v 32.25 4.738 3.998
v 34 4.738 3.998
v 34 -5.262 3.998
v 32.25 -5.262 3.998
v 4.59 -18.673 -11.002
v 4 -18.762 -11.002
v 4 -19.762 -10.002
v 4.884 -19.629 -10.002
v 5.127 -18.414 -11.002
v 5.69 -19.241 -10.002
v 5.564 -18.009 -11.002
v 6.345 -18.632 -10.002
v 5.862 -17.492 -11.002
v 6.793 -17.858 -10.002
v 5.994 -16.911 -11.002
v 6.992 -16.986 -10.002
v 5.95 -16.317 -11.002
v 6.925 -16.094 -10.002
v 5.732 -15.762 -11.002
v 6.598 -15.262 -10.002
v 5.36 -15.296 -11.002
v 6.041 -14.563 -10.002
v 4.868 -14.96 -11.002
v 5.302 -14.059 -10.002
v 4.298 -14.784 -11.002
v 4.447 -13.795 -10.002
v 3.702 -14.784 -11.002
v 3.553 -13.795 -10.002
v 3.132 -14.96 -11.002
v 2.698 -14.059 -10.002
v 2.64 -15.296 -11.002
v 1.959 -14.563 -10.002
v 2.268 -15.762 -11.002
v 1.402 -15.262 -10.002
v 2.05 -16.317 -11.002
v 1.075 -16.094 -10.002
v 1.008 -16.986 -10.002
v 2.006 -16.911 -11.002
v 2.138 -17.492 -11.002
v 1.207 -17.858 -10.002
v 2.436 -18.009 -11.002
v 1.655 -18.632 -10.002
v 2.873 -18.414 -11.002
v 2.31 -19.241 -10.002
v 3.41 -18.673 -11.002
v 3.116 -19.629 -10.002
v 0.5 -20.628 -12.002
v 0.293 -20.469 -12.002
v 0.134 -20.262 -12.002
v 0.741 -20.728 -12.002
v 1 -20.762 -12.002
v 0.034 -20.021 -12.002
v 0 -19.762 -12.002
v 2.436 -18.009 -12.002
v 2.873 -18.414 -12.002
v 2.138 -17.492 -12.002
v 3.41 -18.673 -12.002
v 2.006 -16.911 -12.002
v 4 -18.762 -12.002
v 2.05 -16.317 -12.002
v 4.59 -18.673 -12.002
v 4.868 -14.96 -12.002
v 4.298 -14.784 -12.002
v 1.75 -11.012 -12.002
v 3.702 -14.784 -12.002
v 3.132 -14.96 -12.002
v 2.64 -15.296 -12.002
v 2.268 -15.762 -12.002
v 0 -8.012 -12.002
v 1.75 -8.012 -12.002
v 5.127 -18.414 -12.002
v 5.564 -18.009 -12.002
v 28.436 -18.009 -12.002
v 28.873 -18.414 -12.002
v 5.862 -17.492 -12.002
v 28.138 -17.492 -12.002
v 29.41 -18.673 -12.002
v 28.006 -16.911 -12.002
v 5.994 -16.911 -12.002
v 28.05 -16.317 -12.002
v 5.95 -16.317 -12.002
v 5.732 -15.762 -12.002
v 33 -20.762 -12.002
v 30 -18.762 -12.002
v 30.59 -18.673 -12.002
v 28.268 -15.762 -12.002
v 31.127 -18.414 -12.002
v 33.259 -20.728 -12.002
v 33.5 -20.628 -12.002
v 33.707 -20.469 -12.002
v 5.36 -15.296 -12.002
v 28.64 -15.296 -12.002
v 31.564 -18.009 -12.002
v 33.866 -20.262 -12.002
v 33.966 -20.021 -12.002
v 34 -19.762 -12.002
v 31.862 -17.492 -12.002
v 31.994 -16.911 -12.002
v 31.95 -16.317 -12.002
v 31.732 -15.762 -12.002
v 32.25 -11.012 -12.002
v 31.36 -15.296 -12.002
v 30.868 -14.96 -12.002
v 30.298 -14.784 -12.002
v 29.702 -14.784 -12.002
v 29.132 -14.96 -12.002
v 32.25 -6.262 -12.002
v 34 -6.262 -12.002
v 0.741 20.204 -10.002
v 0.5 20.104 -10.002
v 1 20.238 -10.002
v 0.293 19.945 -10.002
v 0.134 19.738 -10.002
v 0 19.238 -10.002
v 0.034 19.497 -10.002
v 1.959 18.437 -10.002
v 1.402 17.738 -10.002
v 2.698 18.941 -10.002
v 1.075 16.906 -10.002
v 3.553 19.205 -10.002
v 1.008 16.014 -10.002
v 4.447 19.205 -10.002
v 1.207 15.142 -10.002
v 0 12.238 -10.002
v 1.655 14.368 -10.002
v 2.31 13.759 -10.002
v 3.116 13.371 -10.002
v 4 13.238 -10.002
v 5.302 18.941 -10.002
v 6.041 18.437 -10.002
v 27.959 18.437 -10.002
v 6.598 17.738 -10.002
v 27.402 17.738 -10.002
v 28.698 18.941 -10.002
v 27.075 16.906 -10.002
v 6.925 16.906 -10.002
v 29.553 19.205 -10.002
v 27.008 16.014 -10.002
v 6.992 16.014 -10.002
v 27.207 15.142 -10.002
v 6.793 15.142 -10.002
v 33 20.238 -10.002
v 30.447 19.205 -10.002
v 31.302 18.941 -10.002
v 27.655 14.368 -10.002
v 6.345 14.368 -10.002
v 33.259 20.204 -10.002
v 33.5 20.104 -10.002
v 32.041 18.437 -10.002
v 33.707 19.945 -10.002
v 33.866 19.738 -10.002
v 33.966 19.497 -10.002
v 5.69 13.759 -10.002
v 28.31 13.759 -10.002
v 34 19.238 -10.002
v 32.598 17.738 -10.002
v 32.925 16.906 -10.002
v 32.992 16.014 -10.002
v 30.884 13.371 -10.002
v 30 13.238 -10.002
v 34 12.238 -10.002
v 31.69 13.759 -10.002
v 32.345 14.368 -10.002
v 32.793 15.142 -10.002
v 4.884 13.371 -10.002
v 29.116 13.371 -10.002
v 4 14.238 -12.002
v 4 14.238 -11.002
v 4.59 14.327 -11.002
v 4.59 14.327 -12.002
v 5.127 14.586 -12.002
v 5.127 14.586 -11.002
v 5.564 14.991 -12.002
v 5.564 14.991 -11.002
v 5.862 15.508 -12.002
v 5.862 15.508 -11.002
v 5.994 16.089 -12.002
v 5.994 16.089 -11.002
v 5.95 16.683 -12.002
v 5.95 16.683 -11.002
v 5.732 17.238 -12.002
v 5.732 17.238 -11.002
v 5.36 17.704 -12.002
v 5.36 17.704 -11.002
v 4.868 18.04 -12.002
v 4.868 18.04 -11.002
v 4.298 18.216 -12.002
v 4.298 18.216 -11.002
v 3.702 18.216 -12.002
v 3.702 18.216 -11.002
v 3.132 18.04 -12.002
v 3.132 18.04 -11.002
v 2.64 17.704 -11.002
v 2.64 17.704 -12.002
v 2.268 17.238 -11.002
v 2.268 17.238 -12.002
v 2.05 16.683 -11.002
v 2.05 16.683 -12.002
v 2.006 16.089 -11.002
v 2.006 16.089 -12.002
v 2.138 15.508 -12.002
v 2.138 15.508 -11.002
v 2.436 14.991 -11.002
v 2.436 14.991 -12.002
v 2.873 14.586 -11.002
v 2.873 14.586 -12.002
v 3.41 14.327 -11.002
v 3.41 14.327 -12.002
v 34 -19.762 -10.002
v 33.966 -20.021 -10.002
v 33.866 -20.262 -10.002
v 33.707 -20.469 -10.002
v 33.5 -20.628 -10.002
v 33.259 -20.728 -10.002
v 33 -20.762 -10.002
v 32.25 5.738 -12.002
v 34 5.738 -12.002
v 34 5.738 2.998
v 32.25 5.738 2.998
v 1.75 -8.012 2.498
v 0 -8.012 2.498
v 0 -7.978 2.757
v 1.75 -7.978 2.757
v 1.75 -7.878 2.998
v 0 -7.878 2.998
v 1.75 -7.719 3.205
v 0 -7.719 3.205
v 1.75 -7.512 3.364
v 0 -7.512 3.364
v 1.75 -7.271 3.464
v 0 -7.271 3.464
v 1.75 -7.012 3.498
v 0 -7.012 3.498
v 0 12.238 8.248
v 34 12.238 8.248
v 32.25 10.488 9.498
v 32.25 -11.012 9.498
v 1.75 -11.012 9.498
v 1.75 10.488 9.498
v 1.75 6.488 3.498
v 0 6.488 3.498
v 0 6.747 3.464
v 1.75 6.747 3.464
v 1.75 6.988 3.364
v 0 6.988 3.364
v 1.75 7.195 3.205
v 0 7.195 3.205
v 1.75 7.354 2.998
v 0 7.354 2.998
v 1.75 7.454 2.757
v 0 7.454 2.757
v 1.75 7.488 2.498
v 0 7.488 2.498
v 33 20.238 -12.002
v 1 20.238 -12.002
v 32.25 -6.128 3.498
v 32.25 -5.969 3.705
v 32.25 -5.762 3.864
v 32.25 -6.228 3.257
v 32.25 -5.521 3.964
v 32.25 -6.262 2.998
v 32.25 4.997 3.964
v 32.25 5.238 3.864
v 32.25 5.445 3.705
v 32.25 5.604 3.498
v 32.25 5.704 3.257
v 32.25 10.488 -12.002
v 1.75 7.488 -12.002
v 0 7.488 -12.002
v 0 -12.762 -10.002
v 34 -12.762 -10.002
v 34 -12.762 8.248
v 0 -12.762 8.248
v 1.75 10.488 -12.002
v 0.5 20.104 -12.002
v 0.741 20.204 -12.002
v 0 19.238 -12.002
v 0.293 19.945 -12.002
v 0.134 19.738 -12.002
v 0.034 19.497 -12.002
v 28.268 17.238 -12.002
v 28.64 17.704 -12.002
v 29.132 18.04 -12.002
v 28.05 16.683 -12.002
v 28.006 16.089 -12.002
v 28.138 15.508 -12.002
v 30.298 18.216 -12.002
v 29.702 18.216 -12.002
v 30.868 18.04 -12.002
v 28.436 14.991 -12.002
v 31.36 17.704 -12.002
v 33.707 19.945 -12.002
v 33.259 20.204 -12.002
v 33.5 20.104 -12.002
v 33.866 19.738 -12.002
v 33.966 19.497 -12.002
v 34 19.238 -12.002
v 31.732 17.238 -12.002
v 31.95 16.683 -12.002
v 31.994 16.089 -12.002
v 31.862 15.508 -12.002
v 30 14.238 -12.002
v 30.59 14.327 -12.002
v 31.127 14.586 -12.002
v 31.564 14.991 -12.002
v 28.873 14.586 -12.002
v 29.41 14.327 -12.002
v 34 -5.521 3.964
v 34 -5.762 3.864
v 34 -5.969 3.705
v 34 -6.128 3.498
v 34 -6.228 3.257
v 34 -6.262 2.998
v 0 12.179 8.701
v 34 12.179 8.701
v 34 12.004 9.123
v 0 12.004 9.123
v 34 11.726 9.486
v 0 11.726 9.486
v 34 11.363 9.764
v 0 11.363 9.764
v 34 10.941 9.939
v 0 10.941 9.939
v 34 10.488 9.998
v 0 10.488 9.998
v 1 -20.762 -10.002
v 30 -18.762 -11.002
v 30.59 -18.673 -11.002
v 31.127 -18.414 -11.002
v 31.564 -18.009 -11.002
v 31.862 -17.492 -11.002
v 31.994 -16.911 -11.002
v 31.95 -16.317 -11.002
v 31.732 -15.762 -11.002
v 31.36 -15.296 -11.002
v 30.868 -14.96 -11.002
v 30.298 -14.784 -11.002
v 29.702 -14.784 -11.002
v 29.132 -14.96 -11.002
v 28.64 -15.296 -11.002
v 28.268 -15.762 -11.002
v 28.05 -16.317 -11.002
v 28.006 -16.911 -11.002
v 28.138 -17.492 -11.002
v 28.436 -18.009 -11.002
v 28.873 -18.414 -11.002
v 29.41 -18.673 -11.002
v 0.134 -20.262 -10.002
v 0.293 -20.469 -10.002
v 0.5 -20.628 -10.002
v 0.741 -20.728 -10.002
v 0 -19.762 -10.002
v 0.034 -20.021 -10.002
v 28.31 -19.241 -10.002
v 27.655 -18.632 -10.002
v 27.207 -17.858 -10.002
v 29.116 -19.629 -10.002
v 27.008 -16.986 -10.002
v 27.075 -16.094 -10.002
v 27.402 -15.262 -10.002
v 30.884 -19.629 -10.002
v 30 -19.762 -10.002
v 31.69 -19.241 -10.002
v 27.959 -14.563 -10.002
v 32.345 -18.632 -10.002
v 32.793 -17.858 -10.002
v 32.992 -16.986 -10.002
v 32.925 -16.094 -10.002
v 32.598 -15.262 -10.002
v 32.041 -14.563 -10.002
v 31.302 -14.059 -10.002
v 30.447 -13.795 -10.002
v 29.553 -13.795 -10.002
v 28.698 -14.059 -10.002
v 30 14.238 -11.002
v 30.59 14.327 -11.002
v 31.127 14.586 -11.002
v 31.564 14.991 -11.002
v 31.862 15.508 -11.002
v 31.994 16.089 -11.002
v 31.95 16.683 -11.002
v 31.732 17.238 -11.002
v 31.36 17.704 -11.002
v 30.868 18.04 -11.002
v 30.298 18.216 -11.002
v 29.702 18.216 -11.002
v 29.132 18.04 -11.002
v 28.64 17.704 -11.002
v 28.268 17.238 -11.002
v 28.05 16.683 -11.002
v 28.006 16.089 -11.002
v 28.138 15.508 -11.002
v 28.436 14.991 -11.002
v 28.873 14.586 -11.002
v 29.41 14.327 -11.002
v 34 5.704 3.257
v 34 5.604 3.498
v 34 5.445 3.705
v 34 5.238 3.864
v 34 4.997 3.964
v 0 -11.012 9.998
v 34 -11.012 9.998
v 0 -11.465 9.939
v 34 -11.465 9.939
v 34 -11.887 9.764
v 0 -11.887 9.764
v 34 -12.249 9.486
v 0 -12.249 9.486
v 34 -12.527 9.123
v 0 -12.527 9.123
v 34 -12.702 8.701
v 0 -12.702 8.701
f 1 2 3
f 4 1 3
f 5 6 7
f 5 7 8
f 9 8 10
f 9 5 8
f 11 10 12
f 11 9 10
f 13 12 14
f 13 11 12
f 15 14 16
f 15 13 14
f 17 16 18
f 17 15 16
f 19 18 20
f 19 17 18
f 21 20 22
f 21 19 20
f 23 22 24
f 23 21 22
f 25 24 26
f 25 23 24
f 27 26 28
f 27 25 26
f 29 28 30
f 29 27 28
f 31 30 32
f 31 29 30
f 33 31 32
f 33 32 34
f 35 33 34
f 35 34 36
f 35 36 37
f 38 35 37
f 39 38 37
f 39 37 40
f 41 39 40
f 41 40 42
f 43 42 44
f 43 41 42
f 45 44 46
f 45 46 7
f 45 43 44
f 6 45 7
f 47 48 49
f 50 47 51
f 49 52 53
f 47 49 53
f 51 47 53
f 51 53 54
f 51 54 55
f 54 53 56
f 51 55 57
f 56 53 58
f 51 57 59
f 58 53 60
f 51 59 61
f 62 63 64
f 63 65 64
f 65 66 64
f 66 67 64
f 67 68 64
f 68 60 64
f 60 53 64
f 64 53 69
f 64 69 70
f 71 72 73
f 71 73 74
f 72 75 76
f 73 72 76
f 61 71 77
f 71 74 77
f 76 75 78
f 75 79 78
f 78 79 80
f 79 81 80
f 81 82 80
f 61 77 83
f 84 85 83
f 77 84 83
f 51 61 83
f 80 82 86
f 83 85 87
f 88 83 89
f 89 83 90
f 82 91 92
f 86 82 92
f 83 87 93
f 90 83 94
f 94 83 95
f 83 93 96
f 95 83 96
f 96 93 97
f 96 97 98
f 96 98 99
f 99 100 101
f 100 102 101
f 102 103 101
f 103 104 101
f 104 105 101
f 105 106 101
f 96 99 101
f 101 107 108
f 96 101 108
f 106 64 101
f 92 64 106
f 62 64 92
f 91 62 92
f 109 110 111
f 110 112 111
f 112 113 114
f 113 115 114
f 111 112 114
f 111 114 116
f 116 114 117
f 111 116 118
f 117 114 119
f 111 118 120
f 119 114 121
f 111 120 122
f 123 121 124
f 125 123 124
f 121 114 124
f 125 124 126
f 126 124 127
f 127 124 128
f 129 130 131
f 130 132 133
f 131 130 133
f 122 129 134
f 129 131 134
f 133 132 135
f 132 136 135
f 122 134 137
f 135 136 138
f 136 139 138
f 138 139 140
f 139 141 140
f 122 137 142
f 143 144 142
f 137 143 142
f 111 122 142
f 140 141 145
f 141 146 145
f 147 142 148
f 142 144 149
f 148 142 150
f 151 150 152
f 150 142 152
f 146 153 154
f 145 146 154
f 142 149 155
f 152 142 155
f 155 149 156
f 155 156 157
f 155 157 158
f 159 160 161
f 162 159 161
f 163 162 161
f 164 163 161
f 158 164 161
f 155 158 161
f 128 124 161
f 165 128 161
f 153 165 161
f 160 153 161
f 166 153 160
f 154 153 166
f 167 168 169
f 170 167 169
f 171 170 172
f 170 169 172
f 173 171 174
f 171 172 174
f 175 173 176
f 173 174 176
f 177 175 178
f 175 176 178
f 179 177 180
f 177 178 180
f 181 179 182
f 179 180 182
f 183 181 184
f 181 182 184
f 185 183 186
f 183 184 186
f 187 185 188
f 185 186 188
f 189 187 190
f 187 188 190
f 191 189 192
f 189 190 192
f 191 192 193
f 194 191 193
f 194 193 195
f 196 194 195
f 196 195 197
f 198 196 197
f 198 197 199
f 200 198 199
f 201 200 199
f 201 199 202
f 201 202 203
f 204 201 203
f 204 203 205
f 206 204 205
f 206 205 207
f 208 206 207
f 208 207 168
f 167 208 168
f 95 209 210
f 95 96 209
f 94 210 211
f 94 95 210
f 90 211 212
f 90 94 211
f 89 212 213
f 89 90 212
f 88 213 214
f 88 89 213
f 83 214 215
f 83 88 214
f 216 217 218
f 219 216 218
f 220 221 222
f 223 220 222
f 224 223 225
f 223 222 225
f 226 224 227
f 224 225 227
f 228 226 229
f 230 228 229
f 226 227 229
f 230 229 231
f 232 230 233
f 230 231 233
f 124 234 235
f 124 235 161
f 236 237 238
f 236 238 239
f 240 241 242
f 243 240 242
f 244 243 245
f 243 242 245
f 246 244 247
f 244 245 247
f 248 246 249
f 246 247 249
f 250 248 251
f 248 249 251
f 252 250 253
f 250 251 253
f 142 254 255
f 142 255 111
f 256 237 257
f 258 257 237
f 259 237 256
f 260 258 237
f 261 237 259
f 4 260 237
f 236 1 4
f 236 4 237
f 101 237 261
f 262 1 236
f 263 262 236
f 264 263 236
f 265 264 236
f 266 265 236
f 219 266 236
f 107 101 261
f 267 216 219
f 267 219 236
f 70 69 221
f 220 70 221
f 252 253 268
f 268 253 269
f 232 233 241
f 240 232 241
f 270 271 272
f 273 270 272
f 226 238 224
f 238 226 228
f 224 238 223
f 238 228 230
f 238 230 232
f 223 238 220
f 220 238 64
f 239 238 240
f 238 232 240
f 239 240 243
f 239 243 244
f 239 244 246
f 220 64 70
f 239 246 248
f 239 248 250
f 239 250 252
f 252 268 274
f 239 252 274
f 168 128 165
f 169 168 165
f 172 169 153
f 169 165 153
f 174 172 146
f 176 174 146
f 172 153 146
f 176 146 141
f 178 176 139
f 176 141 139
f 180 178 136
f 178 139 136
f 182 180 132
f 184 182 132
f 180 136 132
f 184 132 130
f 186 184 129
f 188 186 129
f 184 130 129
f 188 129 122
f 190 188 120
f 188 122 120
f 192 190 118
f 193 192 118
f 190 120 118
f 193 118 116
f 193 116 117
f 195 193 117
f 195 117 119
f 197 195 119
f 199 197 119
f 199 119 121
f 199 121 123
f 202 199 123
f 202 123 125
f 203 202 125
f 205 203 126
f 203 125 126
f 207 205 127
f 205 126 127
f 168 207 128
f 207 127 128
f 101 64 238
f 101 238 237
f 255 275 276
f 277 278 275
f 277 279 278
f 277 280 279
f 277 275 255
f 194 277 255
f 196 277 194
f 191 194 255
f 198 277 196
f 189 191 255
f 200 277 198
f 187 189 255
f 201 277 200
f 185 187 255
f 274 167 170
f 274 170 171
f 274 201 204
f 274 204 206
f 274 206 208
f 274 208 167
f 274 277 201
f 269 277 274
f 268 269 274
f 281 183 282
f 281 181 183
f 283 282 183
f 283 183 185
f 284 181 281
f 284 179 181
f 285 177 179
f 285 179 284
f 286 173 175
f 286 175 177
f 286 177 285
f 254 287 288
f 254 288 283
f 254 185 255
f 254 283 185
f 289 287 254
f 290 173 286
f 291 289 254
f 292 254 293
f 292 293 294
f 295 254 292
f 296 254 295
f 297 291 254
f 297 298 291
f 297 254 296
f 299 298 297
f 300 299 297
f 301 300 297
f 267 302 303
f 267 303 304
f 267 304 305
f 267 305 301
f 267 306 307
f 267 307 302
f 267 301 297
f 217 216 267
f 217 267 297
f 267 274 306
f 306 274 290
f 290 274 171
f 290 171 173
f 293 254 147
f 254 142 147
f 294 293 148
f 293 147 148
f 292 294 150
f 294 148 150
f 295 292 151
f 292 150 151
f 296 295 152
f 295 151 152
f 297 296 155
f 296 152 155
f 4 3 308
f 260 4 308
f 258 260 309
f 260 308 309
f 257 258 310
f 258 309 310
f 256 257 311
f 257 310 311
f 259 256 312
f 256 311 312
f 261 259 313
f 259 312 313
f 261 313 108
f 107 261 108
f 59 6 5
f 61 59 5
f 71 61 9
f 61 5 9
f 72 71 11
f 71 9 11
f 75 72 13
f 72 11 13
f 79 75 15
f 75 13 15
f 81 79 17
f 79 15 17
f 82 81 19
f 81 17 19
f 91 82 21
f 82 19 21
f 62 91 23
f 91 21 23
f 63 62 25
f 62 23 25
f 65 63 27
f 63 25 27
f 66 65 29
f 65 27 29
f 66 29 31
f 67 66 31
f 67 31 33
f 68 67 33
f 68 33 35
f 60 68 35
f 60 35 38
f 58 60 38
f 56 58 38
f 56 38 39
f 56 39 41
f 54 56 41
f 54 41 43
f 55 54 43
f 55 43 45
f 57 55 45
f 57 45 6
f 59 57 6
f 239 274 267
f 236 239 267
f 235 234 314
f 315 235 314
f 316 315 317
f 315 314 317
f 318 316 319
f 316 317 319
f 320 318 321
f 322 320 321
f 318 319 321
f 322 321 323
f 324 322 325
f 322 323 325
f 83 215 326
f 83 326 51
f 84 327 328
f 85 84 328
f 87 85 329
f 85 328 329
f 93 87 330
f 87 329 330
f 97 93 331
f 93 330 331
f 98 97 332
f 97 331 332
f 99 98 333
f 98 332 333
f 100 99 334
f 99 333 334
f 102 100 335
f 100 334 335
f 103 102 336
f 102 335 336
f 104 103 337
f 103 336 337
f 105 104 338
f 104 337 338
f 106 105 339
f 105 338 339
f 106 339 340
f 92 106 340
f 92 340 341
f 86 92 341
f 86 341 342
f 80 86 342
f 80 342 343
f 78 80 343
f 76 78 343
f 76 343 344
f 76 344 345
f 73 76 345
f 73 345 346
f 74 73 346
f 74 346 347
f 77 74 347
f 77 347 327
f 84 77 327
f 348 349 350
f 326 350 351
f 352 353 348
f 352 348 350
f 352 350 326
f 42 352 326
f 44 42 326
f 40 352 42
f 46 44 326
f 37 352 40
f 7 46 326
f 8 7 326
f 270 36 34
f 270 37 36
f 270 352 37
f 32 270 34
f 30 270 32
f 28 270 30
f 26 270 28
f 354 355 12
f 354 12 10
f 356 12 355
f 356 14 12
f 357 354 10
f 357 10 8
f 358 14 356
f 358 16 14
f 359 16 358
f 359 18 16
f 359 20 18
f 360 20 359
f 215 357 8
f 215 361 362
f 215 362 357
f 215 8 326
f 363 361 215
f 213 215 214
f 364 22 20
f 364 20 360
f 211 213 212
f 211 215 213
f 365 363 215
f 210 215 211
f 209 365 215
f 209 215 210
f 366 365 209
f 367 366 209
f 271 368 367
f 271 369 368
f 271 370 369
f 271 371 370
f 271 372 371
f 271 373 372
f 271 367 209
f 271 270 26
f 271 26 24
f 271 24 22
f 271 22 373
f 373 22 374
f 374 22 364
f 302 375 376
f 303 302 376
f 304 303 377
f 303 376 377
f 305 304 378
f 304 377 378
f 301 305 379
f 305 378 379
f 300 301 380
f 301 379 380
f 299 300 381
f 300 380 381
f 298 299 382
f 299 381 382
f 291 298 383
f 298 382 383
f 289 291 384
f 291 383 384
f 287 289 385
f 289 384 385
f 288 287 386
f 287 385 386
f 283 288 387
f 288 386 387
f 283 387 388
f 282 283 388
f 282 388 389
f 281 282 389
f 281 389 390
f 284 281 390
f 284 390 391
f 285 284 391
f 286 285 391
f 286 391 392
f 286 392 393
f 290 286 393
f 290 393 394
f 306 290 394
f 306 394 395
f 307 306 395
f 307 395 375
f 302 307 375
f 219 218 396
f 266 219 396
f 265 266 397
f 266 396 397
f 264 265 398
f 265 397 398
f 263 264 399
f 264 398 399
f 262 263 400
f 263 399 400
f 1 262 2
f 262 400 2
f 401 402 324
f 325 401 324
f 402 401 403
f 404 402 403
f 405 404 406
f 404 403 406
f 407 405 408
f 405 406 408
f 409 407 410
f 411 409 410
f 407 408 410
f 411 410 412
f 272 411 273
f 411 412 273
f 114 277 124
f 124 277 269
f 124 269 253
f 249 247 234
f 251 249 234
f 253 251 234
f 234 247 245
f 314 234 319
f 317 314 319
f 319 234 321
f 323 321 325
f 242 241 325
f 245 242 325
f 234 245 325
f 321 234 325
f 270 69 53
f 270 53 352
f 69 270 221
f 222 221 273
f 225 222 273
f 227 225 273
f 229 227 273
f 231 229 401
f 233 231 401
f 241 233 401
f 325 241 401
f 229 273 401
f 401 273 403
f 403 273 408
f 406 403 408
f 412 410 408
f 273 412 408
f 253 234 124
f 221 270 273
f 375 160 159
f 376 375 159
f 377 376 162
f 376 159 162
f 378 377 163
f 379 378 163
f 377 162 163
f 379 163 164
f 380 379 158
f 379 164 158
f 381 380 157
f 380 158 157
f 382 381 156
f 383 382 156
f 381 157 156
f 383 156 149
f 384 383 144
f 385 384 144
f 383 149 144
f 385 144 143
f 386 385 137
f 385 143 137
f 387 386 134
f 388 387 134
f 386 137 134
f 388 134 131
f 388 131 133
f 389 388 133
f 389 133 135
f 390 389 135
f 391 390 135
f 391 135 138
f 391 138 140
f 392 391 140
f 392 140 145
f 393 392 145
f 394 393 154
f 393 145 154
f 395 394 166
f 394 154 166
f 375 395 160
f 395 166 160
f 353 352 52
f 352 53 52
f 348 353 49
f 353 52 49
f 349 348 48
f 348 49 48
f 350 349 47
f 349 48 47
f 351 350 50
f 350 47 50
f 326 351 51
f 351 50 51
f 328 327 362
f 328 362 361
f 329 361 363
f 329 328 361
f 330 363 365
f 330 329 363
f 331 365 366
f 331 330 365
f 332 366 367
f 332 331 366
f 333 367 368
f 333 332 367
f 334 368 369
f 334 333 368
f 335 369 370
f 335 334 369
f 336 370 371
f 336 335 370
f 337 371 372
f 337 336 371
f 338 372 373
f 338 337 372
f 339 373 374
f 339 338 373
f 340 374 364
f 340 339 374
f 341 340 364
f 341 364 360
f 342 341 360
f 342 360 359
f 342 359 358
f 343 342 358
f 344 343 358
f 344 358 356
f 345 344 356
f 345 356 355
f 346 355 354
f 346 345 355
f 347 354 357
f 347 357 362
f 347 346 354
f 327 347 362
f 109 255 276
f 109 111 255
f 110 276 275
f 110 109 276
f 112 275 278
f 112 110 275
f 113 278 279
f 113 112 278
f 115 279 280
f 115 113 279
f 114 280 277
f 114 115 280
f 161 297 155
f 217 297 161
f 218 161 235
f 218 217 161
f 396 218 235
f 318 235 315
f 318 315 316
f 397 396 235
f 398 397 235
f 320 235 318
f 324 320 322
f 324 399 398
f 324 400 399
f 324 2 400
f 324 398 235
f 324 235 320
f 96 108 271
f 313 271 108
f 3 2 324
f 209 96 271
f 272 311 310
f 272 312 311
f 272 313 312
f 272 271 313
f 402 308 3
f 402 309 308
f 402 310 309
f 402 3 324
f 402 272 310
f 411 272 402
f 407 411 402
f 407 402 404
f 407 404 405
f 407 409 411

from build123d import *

# Parameters (mm, degrees)
PAD_DEPTH       = 34
SKETCH002_W     = 21.5
SKETCH002_H     = 30.5
POCKET_DEPTH    = 21.5
POCKET001_DEPTH = 5
POCKET002_DEPTH = 5
SKETCH004_W     = 2
SKETCH004_H     = 34
PAD001_DEPTH    = 8
SKETCH005_R     = 2
POCKET003_DEPTH = 5
CHAMFER_SIZE    = 1
SKETCH006_W     = 2
SKETCH006_H     = 34
PAD002_DEPTH    = 8
SKETCH007_R     = 2
POCKET004_DEPTH = 5
CHAMFER001_SIZE = 1
FILLET_R        = 1


with BuildPart() as part:
    # Sketch → Pad (new body)
    with BuildSketch(Plane.YZ):
        with BuildLine():
            Line((-11.011805, 9.998219), (10.488195, 9.998219))
            ThreePointArc((12.238195, 8.248219), (11.725632, 9.485655), (10.488195, 9.998219))
            Line((12.238195, 8.248219), (12.238195, -12.001781))
            Line((12.238195, -12.001781), (-12.761805, -12.001781))
            Line((-12.761805, -12.001781), (-12.761805, 8.248219))
            ThreePointArc((-11.011805, 9.998219), (-12.249242, 9.485655), (-12.761805, 8.248219))
        make_face()
    extrude(amount=PAD_DEPTH)

    # Sketch002 (on Face2 of Pad) → Pocket (cut)
    with BuildSketch(Plane.YX.offset(12.001781)):
        with Locations((-0.261805, 17)):
            Rectangle(SKETCH002_W, SKETCH002_H)
    extrude(amount=-POCKET_DEPTH, mode=Mode.SUBTRACT)

    # Sketch001 (on Face7 of Pad) → Pocket001 (cut)
    with BuildSketch(Plane(origin=(0, 0, 0), x_dir=(0, 1, 0), z_dir=(-1, 0, 0))):
        with BuildLine():
            Line((7.488195, 12.001781), (-8.011805, 12.001781))
            Line((-8.011805, 12.001781), (-8.011805, -2.498219))
            ThreePointArc((-8.011805, -2.498219), (-7.718912, -3.205325), (-7.011805, -3.498219))
            Line((-7.011805, -3.498219), (6.488195, -3.498219))
            ThreePointArc((6.488195, -3.498219), (7.195302, -3.205325), (7.488195, -2.498219))
            Line((7.488195, -2.498219), (7.488195, 12.001781))
        make_face()
    extrude(amount=-POCKET001_DEPTH, mode=Mode.SUBTRACT)

    # Sketch003 (on Face5 of Pocket001) → Pocket002 (cut)
    with BuildSketch(Plane.YZ.offset(34)):
        with BuildLine():
            Line((-6.261805, -12.001781), (5.738195, -12.001781))
            Line((5.738195, -12.001781), (5.738195, 2.998219))
            ThreePointArc((5.738195, 2.998219), (5.445302, 3.705325), (4.738195, 3.998219))
            Line((4.738195, 3.998219), (-5.261805, 3.998219))
            ThreePointArc((-5.261805, 3.998219), (-5.968912, 3.705325), (-6.261805, 2.998219))
            Line((-6.261805, 2.998219), (-6.261805, -12.001781))
        make_face()
    extrude(amount=-POCKET002_DEPTH, mode=Mode.SUBTRACT)

    # Sketch004 (on Face17 of Pocket002) → Pad001 (join)
    with BuildSketch(Plane(origin=(0, -12.761805, 0), x_dir=(0, 0, -1), z_dir=(0, -1, 0))):
        with Locations((11.001781, 17)):
            Rectangle(SKETCH004_W, SKETCH004_H)
    extrude(amount=PAD001_DEPTH)

    # Sketch005 (on Face28 of Pad001) → Pocket003 (cut)
    with BuildSketch(Plane(origin=(0, 0, -10.001781), x_dir=(0, -1, 0), z_dir=(0, 0, 1))):
        with Locations((16.761805, 30)):
            Circle(SKETCH005_R)
        with Locations((16.761805, 4)):
            Circle(SKETCH005_R)
    extrude(amount=-POCKET003_DEPTH, mode=Mode.SUBTRACT)

    # Chamfer
    chamfer_edges = [part.edges().sort_by_distance(p)[0] for p in [
        (4, -14.761805, -10.001781),
        (30, -14.761805, -10.001781),
    ]]
    chamfer(chamfer_edges, length=CHAMFER_SIZE)

    # Sketch006 (on Face15 of Chamfer) → Pad002 (join)
    with BuildSketch(Plane.ZX.offset(12.238195)):
        with Locations((-11.001781, 17)):
            Rectangle(SKETCH006_W, SKETCH006_H)
    extrude(amount=PAD002_DEPTH)

    # Sketch007 (on Face34 of Pad002) → Pocket004 (cut)
    with BuildSketch(Plane(origin=(0, 0, -10.001781), x_dir=(0, -1, 0), z_dir=(0, 0, 1))):
        with Locations((-16.238195, 30)):
            Circle(SKETCH007_R)
        with Locations((-16.238195, 4)):
            Circle(SKETCH007_R)
    extrude(amount=-POCKET004_DEPTH, mode=Mode.SUBTRACT)

    # Chamfer001
    chamfer001_edges = [part.edges().sort_by_distance(p)[0] for p in [
        (30, 18.238195, -10.001781),
        (4, 18.238195, -10.001781),
    ]]
    chamfer(chamfer001_edges, length=CHAMFER001_SIZE)

    # Fillet
    fillet_edges = [part.edges().sort_by_distance(p)[0] for p in [
        (0, -20.761805, -11.001781),
        (34, -20.761805, -11.001781),
        (0, 20.238195, -11.001781),
        (34, 20.238195, -11.001781),
    ]]
    fillet(fillet_edges, radius=FILLET_R)


solid = part.part
